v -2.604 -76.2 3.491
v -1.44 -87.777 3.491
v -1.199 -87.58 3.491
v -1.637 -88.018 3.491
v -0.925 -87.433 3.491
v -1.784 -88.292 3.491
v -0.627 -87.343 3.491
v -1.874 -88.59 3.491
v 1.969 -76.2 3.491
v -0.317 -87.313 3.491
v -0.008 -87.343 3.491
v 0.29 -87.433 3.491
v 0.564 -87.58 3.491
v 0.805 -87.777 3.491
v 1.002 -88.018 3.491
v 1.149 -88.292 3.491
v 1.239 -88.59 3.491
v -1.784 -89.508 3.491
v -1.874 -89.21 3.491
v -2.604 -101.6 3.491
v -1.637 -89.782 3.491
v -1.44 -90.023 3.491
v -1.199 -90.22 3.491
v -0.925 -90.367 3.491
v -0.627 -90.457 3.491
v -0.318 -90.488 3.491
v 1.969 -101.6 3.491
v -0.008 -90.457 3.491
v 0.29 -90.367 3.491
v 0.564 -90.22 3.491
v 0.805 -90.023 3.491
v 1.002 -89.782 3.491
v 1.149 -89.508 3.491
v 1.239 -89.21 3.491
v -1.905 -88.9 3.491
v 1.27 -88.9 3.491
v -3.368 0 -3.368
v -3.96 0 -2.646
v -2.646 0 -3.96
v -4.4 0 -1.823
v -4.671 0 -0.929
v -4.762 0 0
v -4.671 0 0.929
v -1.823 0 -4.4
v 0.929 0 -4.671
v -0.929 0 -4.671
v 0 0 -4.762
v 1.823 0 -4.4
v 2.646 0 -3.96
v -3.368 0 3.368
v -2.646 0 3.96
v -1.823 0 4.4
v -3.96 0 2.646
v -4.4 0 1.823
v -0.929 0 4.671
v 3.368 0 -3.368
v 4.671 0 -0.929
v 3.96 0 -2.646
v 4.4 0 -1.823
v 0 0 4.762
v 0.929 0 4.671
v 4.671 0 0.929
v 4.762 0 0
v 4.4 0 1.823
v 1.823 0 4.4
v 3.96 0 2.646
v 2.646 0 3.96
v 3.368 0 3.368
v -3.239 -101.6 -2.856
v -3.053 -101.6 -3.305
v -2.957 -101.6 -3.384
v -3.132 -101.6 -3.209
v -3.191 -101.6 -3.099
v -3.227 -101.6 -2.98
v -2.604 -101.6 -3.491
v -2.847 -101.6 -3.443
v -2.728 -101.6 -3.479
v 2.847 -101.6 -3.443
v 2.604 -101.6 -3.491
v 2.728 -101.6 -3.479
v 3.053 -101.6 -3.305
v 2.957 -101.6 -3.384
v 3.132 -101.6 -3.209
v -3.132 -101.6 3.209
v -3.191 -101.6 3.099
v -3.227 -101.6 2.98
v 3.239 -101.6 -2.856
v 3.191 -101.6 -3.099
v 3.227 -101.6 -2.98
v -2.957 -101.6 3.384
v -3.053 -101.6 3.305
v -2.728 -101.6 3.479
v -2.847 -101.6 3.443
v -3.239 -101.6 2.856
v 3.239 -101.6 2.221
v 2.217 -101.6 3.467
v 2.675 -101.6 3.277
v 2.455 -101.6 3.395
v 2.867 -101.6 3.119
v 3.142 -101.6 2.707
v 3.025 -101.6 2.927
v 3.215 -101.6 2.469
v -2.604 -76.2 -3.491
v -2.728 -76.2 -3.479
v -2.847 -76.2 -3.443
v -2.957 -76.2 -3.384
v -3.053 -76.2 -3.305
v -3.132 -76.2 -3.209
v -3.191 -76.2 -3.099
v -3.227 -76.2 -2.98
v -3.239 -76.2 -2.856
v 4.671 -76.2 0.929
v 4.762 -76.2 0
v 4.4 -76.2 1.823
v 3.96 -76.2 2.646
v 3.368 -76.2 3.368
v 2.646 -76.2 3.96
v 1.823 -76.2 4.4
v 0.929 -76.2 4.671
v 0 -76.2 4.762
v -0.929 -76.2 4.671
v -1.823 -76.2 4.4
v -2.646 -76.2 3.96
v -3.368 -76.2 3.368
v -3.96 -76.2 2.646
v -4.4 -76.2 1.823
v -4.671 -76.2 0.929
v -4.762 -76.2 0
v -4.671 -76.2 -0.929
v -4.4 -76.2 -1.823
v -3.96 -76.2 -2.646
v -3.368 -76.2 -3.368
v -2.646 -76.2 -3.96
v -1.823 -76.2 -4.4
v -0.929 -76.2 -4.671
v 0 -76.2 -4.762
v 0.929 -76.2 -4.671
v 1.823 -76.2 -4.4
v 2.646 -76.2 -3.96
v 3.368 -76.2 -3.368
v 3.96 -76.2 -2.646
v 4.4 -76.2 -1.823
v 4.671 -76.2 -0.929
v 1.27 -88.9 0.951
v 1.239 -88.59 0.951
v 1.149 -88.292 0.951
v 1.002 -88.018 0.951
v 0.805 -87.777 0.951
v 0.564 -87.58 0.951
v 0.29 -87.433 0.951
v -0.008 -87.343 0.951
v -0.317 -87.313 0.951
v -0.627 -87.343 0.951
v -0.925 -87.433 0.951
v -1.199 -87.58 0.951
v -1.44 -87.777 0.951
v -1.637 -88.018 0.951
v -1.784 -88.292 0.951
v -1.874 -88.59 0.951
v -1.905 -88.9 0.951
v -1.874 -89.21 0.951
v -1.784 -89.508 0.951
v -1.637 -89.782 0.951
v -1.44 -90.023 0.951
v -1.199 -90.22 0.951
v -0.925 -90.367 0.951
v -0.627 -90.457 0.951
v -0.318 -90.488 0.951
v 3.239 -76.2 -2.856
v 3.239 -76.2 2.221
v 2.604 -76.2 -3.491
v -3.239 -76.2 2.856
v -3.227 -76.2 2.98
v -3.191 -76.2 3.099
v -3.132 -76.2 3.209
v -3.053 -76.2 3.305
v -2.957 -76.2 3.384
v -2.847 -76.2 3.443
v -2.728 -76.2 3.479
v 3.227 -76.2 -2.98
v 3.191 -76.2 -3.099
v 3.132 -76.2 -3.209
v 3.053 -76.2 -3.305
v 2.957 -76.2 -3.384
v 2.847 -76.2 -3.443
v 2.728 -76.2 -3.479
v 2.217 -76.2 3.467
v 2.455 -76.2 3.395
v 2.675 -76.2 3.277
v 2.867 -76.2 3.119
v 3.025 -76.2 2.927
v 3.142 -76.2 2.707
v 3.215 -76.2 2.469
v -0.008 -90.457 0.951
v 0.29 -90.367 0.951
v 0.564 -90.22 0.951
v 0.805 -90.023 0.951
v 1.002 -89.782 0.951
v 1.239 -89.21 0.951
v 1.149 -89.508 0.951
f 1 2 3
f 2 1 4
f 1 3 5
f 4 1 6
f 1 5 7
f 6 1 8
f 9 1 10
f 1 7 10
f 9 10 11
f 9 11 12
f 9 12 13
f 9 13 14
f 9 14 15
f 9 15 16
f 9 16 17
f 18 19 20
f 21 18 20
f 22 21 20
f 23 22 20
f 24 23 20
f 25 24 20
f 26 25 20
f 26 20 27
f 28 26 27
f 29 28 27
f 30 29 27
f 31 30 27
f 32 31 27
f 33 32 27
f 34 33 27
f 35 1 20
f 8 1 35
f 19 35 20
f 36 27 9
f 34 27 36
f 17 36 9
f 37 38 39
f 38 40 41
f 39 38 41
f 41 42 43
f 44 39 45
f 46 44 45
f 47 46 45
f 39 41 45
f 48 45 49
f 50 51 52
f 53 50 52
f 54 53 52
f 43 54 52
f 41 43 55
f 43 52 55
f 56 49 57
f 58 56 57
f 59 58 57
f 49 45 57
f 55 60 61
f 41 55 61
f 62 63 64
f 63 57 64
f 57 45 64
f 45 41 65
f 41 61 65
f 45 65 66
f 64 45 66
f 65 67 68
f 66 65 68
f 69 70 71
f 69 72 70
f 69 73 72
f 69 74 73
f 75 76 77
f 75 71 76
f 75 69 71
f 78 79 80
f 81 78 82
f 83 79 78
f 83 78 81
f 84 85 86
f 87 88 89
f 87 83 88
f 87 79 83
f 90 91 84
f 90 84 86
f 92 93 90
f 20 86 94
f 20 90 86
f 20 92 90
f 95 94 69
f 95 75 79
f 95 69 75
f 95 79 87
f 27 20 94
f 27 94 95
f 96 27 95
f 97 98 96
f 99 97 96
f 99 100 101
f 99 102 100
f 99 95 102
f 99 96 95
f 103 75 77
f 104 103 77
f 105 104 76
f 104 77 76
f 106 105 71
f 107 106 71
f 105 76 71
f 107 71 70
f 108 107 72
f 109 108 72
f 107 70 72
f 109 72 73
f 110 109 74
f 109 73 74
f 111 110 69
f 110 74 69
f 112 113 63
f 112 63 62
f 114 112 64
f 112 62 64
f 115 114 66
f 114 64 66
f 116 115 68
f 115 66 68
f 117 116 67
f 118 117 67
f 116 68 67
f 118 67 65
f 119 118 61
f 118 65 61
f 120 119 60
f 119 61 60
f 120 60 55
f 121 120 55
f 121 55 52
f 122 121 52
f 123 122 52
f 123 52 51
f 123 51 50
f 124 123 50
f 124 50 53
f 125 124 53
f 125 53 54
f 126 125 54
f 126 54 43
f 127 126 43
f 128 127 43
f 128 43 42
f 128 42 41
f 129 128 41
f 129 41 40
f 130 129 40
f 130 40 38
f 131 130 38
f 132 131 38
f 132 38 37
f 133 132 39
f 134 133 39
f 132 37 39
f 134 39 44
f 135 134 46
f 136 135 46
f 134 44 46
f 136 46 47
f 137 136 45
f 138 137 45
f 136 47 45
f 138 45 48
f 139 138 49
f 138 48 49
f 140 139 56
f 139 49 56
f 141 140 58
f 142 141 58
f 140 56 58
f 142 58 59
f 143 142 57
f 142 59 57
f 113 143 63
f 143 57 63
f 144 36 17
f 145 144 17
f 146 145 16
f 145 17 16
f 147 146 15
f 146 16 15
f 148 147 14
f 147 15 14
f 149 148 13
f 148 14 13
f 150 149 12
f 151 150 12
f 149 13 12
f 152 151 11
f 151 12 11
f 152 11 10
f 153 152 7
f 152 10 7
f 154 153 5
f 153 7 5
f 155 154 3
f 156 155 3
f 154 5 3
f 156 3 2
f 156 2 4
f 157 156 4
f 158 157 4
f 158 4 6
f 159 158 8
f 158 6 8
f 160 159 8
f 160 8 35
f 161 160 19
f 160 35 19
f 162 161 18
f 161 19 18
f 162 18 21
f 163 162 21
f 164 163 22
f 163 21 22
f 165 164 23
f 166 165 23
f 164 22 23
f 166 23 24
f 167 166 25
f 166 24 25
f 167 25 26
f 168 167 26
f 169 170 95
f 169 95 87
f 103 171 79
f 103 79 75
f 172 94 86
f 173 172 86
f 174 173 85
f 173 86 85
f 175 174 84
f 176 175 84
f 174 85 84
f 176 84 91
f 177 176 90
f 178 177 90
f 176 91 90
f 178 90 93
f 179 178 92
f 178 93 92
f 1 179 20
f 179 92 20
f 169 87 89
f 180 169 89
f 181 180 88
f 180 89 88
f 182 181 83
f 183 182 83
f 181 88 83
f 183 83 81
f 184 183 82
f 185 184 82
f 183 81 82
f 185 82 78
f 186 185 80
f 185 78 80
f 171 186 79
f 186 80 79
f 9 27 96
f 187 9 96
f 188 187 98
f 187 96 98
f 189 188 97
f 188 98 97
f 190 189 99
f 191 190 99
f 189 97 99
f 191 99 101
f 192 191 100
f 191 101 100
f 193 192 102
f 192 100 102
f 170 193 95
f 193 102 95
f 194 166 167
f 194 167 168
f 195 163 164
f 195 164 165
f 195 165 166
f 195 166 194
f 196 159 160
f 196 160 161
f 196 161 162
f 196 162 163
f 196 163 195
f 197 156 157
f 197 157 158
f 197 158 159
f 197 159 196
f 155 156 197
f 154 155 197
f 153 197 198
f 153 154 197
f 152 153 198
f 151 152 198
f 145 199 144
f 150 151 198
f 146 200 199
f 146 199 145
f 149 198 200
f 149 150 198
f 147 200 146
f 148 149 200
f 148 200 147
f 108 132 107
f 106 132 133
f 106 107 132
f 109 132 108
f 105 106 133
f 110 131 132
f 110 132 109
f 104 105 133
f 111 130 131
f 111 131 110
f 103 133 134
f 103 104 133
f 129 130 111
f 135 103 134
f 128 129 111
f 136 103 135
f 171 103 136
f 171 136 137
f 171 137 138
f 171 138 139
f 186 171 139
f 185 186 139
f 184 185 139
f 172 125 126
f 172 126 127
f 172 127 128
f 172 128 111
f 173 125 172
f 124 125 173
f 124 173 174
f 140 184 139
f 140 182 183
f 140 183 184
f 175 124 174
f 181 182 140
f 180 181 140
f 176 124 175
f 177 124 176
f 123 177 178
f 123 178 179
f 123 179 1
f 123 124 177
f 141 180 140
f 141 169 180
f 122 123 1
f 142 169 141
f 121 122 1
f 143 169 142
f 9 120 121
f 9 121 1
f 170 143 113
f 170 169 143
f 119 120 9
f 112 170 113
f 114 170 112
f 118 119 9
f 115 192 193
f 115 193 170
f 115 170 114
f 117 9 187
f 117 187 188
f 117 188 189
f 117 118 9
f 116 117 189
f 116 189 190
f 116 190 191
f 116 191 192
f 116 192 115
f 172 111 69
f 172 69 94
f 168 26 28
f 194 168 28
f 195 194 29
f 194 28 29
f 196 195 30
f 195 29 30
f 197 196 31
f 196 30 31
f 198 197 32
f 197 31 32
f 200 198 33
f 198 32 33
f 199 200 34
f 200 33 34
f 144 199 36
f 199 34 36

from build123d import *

# Parameters (mm, degrees)
F0_R     = 4.7625
F1_DEPTH = 101.6
F2_R     = 4.7625
F3_DEPTH = 25.4
F5_DEPTH = 2.54


with BuildPart() as f1:
    # F0 (on Front) → F1 (new body)
    with BuildSketch(Plane.XZ):
        Circle(F0_R)
    extrude(amount=F1_DEPTH)

    # F2 (on face) → F3 (cut)
    with BuildSketch(Plane.XZ.offset(101.6)):
        Circle(F2_R)
        with BuildLine():
            ThreePointArc((-3.239123, 2.856345), (-3.053136, 3.305358), (-2.604123, 3.491345))
            Line((-2.604123, 3.491345), (1.969123, 3.491345))
            ThreePointArc((1.969123, 3.491345), (2.867149, 3.11937), (3.239123, 2.221345))
            Line((3.239123, 2.221345), (3.239123, -2.856345))
            ThreePointArc((3.239123, -2.856345), (3.053136, -3.305358), (2.604123, -3.491345))
            Line((2.604123, -3.491345), (-2.604123, -3.491345))
            ThreePointArc((-2.604123, -3.491345), (-3.053136, -3.305358), (-3.239123, -2.856345))
            Line((-3.239123, -2.856345), (-3.239123, 2.856345))
        make_face(mode=Mode.SUBTRACT)
    extrude(amount=-F3_DEPTH, mode=Mode.SUBTRACT)

    # F4 (on face) → F5 (cut)
    with BuildSketch(Plane.XY.offset(3.491345)):
        with BuildLine():
            ThreePointArc((-0.3175, -90.4875), (0.805032, -90.022532), (1.27, -88.9))
            ThreePointArc((1.27, -88.9), (-1.440032, -87.777468), (-0.3175, -90.4875))
        make_face()
    extrude(amount=-F5_DEPTH, mode=Mode.SUBTRACT)


solid = f1.part
